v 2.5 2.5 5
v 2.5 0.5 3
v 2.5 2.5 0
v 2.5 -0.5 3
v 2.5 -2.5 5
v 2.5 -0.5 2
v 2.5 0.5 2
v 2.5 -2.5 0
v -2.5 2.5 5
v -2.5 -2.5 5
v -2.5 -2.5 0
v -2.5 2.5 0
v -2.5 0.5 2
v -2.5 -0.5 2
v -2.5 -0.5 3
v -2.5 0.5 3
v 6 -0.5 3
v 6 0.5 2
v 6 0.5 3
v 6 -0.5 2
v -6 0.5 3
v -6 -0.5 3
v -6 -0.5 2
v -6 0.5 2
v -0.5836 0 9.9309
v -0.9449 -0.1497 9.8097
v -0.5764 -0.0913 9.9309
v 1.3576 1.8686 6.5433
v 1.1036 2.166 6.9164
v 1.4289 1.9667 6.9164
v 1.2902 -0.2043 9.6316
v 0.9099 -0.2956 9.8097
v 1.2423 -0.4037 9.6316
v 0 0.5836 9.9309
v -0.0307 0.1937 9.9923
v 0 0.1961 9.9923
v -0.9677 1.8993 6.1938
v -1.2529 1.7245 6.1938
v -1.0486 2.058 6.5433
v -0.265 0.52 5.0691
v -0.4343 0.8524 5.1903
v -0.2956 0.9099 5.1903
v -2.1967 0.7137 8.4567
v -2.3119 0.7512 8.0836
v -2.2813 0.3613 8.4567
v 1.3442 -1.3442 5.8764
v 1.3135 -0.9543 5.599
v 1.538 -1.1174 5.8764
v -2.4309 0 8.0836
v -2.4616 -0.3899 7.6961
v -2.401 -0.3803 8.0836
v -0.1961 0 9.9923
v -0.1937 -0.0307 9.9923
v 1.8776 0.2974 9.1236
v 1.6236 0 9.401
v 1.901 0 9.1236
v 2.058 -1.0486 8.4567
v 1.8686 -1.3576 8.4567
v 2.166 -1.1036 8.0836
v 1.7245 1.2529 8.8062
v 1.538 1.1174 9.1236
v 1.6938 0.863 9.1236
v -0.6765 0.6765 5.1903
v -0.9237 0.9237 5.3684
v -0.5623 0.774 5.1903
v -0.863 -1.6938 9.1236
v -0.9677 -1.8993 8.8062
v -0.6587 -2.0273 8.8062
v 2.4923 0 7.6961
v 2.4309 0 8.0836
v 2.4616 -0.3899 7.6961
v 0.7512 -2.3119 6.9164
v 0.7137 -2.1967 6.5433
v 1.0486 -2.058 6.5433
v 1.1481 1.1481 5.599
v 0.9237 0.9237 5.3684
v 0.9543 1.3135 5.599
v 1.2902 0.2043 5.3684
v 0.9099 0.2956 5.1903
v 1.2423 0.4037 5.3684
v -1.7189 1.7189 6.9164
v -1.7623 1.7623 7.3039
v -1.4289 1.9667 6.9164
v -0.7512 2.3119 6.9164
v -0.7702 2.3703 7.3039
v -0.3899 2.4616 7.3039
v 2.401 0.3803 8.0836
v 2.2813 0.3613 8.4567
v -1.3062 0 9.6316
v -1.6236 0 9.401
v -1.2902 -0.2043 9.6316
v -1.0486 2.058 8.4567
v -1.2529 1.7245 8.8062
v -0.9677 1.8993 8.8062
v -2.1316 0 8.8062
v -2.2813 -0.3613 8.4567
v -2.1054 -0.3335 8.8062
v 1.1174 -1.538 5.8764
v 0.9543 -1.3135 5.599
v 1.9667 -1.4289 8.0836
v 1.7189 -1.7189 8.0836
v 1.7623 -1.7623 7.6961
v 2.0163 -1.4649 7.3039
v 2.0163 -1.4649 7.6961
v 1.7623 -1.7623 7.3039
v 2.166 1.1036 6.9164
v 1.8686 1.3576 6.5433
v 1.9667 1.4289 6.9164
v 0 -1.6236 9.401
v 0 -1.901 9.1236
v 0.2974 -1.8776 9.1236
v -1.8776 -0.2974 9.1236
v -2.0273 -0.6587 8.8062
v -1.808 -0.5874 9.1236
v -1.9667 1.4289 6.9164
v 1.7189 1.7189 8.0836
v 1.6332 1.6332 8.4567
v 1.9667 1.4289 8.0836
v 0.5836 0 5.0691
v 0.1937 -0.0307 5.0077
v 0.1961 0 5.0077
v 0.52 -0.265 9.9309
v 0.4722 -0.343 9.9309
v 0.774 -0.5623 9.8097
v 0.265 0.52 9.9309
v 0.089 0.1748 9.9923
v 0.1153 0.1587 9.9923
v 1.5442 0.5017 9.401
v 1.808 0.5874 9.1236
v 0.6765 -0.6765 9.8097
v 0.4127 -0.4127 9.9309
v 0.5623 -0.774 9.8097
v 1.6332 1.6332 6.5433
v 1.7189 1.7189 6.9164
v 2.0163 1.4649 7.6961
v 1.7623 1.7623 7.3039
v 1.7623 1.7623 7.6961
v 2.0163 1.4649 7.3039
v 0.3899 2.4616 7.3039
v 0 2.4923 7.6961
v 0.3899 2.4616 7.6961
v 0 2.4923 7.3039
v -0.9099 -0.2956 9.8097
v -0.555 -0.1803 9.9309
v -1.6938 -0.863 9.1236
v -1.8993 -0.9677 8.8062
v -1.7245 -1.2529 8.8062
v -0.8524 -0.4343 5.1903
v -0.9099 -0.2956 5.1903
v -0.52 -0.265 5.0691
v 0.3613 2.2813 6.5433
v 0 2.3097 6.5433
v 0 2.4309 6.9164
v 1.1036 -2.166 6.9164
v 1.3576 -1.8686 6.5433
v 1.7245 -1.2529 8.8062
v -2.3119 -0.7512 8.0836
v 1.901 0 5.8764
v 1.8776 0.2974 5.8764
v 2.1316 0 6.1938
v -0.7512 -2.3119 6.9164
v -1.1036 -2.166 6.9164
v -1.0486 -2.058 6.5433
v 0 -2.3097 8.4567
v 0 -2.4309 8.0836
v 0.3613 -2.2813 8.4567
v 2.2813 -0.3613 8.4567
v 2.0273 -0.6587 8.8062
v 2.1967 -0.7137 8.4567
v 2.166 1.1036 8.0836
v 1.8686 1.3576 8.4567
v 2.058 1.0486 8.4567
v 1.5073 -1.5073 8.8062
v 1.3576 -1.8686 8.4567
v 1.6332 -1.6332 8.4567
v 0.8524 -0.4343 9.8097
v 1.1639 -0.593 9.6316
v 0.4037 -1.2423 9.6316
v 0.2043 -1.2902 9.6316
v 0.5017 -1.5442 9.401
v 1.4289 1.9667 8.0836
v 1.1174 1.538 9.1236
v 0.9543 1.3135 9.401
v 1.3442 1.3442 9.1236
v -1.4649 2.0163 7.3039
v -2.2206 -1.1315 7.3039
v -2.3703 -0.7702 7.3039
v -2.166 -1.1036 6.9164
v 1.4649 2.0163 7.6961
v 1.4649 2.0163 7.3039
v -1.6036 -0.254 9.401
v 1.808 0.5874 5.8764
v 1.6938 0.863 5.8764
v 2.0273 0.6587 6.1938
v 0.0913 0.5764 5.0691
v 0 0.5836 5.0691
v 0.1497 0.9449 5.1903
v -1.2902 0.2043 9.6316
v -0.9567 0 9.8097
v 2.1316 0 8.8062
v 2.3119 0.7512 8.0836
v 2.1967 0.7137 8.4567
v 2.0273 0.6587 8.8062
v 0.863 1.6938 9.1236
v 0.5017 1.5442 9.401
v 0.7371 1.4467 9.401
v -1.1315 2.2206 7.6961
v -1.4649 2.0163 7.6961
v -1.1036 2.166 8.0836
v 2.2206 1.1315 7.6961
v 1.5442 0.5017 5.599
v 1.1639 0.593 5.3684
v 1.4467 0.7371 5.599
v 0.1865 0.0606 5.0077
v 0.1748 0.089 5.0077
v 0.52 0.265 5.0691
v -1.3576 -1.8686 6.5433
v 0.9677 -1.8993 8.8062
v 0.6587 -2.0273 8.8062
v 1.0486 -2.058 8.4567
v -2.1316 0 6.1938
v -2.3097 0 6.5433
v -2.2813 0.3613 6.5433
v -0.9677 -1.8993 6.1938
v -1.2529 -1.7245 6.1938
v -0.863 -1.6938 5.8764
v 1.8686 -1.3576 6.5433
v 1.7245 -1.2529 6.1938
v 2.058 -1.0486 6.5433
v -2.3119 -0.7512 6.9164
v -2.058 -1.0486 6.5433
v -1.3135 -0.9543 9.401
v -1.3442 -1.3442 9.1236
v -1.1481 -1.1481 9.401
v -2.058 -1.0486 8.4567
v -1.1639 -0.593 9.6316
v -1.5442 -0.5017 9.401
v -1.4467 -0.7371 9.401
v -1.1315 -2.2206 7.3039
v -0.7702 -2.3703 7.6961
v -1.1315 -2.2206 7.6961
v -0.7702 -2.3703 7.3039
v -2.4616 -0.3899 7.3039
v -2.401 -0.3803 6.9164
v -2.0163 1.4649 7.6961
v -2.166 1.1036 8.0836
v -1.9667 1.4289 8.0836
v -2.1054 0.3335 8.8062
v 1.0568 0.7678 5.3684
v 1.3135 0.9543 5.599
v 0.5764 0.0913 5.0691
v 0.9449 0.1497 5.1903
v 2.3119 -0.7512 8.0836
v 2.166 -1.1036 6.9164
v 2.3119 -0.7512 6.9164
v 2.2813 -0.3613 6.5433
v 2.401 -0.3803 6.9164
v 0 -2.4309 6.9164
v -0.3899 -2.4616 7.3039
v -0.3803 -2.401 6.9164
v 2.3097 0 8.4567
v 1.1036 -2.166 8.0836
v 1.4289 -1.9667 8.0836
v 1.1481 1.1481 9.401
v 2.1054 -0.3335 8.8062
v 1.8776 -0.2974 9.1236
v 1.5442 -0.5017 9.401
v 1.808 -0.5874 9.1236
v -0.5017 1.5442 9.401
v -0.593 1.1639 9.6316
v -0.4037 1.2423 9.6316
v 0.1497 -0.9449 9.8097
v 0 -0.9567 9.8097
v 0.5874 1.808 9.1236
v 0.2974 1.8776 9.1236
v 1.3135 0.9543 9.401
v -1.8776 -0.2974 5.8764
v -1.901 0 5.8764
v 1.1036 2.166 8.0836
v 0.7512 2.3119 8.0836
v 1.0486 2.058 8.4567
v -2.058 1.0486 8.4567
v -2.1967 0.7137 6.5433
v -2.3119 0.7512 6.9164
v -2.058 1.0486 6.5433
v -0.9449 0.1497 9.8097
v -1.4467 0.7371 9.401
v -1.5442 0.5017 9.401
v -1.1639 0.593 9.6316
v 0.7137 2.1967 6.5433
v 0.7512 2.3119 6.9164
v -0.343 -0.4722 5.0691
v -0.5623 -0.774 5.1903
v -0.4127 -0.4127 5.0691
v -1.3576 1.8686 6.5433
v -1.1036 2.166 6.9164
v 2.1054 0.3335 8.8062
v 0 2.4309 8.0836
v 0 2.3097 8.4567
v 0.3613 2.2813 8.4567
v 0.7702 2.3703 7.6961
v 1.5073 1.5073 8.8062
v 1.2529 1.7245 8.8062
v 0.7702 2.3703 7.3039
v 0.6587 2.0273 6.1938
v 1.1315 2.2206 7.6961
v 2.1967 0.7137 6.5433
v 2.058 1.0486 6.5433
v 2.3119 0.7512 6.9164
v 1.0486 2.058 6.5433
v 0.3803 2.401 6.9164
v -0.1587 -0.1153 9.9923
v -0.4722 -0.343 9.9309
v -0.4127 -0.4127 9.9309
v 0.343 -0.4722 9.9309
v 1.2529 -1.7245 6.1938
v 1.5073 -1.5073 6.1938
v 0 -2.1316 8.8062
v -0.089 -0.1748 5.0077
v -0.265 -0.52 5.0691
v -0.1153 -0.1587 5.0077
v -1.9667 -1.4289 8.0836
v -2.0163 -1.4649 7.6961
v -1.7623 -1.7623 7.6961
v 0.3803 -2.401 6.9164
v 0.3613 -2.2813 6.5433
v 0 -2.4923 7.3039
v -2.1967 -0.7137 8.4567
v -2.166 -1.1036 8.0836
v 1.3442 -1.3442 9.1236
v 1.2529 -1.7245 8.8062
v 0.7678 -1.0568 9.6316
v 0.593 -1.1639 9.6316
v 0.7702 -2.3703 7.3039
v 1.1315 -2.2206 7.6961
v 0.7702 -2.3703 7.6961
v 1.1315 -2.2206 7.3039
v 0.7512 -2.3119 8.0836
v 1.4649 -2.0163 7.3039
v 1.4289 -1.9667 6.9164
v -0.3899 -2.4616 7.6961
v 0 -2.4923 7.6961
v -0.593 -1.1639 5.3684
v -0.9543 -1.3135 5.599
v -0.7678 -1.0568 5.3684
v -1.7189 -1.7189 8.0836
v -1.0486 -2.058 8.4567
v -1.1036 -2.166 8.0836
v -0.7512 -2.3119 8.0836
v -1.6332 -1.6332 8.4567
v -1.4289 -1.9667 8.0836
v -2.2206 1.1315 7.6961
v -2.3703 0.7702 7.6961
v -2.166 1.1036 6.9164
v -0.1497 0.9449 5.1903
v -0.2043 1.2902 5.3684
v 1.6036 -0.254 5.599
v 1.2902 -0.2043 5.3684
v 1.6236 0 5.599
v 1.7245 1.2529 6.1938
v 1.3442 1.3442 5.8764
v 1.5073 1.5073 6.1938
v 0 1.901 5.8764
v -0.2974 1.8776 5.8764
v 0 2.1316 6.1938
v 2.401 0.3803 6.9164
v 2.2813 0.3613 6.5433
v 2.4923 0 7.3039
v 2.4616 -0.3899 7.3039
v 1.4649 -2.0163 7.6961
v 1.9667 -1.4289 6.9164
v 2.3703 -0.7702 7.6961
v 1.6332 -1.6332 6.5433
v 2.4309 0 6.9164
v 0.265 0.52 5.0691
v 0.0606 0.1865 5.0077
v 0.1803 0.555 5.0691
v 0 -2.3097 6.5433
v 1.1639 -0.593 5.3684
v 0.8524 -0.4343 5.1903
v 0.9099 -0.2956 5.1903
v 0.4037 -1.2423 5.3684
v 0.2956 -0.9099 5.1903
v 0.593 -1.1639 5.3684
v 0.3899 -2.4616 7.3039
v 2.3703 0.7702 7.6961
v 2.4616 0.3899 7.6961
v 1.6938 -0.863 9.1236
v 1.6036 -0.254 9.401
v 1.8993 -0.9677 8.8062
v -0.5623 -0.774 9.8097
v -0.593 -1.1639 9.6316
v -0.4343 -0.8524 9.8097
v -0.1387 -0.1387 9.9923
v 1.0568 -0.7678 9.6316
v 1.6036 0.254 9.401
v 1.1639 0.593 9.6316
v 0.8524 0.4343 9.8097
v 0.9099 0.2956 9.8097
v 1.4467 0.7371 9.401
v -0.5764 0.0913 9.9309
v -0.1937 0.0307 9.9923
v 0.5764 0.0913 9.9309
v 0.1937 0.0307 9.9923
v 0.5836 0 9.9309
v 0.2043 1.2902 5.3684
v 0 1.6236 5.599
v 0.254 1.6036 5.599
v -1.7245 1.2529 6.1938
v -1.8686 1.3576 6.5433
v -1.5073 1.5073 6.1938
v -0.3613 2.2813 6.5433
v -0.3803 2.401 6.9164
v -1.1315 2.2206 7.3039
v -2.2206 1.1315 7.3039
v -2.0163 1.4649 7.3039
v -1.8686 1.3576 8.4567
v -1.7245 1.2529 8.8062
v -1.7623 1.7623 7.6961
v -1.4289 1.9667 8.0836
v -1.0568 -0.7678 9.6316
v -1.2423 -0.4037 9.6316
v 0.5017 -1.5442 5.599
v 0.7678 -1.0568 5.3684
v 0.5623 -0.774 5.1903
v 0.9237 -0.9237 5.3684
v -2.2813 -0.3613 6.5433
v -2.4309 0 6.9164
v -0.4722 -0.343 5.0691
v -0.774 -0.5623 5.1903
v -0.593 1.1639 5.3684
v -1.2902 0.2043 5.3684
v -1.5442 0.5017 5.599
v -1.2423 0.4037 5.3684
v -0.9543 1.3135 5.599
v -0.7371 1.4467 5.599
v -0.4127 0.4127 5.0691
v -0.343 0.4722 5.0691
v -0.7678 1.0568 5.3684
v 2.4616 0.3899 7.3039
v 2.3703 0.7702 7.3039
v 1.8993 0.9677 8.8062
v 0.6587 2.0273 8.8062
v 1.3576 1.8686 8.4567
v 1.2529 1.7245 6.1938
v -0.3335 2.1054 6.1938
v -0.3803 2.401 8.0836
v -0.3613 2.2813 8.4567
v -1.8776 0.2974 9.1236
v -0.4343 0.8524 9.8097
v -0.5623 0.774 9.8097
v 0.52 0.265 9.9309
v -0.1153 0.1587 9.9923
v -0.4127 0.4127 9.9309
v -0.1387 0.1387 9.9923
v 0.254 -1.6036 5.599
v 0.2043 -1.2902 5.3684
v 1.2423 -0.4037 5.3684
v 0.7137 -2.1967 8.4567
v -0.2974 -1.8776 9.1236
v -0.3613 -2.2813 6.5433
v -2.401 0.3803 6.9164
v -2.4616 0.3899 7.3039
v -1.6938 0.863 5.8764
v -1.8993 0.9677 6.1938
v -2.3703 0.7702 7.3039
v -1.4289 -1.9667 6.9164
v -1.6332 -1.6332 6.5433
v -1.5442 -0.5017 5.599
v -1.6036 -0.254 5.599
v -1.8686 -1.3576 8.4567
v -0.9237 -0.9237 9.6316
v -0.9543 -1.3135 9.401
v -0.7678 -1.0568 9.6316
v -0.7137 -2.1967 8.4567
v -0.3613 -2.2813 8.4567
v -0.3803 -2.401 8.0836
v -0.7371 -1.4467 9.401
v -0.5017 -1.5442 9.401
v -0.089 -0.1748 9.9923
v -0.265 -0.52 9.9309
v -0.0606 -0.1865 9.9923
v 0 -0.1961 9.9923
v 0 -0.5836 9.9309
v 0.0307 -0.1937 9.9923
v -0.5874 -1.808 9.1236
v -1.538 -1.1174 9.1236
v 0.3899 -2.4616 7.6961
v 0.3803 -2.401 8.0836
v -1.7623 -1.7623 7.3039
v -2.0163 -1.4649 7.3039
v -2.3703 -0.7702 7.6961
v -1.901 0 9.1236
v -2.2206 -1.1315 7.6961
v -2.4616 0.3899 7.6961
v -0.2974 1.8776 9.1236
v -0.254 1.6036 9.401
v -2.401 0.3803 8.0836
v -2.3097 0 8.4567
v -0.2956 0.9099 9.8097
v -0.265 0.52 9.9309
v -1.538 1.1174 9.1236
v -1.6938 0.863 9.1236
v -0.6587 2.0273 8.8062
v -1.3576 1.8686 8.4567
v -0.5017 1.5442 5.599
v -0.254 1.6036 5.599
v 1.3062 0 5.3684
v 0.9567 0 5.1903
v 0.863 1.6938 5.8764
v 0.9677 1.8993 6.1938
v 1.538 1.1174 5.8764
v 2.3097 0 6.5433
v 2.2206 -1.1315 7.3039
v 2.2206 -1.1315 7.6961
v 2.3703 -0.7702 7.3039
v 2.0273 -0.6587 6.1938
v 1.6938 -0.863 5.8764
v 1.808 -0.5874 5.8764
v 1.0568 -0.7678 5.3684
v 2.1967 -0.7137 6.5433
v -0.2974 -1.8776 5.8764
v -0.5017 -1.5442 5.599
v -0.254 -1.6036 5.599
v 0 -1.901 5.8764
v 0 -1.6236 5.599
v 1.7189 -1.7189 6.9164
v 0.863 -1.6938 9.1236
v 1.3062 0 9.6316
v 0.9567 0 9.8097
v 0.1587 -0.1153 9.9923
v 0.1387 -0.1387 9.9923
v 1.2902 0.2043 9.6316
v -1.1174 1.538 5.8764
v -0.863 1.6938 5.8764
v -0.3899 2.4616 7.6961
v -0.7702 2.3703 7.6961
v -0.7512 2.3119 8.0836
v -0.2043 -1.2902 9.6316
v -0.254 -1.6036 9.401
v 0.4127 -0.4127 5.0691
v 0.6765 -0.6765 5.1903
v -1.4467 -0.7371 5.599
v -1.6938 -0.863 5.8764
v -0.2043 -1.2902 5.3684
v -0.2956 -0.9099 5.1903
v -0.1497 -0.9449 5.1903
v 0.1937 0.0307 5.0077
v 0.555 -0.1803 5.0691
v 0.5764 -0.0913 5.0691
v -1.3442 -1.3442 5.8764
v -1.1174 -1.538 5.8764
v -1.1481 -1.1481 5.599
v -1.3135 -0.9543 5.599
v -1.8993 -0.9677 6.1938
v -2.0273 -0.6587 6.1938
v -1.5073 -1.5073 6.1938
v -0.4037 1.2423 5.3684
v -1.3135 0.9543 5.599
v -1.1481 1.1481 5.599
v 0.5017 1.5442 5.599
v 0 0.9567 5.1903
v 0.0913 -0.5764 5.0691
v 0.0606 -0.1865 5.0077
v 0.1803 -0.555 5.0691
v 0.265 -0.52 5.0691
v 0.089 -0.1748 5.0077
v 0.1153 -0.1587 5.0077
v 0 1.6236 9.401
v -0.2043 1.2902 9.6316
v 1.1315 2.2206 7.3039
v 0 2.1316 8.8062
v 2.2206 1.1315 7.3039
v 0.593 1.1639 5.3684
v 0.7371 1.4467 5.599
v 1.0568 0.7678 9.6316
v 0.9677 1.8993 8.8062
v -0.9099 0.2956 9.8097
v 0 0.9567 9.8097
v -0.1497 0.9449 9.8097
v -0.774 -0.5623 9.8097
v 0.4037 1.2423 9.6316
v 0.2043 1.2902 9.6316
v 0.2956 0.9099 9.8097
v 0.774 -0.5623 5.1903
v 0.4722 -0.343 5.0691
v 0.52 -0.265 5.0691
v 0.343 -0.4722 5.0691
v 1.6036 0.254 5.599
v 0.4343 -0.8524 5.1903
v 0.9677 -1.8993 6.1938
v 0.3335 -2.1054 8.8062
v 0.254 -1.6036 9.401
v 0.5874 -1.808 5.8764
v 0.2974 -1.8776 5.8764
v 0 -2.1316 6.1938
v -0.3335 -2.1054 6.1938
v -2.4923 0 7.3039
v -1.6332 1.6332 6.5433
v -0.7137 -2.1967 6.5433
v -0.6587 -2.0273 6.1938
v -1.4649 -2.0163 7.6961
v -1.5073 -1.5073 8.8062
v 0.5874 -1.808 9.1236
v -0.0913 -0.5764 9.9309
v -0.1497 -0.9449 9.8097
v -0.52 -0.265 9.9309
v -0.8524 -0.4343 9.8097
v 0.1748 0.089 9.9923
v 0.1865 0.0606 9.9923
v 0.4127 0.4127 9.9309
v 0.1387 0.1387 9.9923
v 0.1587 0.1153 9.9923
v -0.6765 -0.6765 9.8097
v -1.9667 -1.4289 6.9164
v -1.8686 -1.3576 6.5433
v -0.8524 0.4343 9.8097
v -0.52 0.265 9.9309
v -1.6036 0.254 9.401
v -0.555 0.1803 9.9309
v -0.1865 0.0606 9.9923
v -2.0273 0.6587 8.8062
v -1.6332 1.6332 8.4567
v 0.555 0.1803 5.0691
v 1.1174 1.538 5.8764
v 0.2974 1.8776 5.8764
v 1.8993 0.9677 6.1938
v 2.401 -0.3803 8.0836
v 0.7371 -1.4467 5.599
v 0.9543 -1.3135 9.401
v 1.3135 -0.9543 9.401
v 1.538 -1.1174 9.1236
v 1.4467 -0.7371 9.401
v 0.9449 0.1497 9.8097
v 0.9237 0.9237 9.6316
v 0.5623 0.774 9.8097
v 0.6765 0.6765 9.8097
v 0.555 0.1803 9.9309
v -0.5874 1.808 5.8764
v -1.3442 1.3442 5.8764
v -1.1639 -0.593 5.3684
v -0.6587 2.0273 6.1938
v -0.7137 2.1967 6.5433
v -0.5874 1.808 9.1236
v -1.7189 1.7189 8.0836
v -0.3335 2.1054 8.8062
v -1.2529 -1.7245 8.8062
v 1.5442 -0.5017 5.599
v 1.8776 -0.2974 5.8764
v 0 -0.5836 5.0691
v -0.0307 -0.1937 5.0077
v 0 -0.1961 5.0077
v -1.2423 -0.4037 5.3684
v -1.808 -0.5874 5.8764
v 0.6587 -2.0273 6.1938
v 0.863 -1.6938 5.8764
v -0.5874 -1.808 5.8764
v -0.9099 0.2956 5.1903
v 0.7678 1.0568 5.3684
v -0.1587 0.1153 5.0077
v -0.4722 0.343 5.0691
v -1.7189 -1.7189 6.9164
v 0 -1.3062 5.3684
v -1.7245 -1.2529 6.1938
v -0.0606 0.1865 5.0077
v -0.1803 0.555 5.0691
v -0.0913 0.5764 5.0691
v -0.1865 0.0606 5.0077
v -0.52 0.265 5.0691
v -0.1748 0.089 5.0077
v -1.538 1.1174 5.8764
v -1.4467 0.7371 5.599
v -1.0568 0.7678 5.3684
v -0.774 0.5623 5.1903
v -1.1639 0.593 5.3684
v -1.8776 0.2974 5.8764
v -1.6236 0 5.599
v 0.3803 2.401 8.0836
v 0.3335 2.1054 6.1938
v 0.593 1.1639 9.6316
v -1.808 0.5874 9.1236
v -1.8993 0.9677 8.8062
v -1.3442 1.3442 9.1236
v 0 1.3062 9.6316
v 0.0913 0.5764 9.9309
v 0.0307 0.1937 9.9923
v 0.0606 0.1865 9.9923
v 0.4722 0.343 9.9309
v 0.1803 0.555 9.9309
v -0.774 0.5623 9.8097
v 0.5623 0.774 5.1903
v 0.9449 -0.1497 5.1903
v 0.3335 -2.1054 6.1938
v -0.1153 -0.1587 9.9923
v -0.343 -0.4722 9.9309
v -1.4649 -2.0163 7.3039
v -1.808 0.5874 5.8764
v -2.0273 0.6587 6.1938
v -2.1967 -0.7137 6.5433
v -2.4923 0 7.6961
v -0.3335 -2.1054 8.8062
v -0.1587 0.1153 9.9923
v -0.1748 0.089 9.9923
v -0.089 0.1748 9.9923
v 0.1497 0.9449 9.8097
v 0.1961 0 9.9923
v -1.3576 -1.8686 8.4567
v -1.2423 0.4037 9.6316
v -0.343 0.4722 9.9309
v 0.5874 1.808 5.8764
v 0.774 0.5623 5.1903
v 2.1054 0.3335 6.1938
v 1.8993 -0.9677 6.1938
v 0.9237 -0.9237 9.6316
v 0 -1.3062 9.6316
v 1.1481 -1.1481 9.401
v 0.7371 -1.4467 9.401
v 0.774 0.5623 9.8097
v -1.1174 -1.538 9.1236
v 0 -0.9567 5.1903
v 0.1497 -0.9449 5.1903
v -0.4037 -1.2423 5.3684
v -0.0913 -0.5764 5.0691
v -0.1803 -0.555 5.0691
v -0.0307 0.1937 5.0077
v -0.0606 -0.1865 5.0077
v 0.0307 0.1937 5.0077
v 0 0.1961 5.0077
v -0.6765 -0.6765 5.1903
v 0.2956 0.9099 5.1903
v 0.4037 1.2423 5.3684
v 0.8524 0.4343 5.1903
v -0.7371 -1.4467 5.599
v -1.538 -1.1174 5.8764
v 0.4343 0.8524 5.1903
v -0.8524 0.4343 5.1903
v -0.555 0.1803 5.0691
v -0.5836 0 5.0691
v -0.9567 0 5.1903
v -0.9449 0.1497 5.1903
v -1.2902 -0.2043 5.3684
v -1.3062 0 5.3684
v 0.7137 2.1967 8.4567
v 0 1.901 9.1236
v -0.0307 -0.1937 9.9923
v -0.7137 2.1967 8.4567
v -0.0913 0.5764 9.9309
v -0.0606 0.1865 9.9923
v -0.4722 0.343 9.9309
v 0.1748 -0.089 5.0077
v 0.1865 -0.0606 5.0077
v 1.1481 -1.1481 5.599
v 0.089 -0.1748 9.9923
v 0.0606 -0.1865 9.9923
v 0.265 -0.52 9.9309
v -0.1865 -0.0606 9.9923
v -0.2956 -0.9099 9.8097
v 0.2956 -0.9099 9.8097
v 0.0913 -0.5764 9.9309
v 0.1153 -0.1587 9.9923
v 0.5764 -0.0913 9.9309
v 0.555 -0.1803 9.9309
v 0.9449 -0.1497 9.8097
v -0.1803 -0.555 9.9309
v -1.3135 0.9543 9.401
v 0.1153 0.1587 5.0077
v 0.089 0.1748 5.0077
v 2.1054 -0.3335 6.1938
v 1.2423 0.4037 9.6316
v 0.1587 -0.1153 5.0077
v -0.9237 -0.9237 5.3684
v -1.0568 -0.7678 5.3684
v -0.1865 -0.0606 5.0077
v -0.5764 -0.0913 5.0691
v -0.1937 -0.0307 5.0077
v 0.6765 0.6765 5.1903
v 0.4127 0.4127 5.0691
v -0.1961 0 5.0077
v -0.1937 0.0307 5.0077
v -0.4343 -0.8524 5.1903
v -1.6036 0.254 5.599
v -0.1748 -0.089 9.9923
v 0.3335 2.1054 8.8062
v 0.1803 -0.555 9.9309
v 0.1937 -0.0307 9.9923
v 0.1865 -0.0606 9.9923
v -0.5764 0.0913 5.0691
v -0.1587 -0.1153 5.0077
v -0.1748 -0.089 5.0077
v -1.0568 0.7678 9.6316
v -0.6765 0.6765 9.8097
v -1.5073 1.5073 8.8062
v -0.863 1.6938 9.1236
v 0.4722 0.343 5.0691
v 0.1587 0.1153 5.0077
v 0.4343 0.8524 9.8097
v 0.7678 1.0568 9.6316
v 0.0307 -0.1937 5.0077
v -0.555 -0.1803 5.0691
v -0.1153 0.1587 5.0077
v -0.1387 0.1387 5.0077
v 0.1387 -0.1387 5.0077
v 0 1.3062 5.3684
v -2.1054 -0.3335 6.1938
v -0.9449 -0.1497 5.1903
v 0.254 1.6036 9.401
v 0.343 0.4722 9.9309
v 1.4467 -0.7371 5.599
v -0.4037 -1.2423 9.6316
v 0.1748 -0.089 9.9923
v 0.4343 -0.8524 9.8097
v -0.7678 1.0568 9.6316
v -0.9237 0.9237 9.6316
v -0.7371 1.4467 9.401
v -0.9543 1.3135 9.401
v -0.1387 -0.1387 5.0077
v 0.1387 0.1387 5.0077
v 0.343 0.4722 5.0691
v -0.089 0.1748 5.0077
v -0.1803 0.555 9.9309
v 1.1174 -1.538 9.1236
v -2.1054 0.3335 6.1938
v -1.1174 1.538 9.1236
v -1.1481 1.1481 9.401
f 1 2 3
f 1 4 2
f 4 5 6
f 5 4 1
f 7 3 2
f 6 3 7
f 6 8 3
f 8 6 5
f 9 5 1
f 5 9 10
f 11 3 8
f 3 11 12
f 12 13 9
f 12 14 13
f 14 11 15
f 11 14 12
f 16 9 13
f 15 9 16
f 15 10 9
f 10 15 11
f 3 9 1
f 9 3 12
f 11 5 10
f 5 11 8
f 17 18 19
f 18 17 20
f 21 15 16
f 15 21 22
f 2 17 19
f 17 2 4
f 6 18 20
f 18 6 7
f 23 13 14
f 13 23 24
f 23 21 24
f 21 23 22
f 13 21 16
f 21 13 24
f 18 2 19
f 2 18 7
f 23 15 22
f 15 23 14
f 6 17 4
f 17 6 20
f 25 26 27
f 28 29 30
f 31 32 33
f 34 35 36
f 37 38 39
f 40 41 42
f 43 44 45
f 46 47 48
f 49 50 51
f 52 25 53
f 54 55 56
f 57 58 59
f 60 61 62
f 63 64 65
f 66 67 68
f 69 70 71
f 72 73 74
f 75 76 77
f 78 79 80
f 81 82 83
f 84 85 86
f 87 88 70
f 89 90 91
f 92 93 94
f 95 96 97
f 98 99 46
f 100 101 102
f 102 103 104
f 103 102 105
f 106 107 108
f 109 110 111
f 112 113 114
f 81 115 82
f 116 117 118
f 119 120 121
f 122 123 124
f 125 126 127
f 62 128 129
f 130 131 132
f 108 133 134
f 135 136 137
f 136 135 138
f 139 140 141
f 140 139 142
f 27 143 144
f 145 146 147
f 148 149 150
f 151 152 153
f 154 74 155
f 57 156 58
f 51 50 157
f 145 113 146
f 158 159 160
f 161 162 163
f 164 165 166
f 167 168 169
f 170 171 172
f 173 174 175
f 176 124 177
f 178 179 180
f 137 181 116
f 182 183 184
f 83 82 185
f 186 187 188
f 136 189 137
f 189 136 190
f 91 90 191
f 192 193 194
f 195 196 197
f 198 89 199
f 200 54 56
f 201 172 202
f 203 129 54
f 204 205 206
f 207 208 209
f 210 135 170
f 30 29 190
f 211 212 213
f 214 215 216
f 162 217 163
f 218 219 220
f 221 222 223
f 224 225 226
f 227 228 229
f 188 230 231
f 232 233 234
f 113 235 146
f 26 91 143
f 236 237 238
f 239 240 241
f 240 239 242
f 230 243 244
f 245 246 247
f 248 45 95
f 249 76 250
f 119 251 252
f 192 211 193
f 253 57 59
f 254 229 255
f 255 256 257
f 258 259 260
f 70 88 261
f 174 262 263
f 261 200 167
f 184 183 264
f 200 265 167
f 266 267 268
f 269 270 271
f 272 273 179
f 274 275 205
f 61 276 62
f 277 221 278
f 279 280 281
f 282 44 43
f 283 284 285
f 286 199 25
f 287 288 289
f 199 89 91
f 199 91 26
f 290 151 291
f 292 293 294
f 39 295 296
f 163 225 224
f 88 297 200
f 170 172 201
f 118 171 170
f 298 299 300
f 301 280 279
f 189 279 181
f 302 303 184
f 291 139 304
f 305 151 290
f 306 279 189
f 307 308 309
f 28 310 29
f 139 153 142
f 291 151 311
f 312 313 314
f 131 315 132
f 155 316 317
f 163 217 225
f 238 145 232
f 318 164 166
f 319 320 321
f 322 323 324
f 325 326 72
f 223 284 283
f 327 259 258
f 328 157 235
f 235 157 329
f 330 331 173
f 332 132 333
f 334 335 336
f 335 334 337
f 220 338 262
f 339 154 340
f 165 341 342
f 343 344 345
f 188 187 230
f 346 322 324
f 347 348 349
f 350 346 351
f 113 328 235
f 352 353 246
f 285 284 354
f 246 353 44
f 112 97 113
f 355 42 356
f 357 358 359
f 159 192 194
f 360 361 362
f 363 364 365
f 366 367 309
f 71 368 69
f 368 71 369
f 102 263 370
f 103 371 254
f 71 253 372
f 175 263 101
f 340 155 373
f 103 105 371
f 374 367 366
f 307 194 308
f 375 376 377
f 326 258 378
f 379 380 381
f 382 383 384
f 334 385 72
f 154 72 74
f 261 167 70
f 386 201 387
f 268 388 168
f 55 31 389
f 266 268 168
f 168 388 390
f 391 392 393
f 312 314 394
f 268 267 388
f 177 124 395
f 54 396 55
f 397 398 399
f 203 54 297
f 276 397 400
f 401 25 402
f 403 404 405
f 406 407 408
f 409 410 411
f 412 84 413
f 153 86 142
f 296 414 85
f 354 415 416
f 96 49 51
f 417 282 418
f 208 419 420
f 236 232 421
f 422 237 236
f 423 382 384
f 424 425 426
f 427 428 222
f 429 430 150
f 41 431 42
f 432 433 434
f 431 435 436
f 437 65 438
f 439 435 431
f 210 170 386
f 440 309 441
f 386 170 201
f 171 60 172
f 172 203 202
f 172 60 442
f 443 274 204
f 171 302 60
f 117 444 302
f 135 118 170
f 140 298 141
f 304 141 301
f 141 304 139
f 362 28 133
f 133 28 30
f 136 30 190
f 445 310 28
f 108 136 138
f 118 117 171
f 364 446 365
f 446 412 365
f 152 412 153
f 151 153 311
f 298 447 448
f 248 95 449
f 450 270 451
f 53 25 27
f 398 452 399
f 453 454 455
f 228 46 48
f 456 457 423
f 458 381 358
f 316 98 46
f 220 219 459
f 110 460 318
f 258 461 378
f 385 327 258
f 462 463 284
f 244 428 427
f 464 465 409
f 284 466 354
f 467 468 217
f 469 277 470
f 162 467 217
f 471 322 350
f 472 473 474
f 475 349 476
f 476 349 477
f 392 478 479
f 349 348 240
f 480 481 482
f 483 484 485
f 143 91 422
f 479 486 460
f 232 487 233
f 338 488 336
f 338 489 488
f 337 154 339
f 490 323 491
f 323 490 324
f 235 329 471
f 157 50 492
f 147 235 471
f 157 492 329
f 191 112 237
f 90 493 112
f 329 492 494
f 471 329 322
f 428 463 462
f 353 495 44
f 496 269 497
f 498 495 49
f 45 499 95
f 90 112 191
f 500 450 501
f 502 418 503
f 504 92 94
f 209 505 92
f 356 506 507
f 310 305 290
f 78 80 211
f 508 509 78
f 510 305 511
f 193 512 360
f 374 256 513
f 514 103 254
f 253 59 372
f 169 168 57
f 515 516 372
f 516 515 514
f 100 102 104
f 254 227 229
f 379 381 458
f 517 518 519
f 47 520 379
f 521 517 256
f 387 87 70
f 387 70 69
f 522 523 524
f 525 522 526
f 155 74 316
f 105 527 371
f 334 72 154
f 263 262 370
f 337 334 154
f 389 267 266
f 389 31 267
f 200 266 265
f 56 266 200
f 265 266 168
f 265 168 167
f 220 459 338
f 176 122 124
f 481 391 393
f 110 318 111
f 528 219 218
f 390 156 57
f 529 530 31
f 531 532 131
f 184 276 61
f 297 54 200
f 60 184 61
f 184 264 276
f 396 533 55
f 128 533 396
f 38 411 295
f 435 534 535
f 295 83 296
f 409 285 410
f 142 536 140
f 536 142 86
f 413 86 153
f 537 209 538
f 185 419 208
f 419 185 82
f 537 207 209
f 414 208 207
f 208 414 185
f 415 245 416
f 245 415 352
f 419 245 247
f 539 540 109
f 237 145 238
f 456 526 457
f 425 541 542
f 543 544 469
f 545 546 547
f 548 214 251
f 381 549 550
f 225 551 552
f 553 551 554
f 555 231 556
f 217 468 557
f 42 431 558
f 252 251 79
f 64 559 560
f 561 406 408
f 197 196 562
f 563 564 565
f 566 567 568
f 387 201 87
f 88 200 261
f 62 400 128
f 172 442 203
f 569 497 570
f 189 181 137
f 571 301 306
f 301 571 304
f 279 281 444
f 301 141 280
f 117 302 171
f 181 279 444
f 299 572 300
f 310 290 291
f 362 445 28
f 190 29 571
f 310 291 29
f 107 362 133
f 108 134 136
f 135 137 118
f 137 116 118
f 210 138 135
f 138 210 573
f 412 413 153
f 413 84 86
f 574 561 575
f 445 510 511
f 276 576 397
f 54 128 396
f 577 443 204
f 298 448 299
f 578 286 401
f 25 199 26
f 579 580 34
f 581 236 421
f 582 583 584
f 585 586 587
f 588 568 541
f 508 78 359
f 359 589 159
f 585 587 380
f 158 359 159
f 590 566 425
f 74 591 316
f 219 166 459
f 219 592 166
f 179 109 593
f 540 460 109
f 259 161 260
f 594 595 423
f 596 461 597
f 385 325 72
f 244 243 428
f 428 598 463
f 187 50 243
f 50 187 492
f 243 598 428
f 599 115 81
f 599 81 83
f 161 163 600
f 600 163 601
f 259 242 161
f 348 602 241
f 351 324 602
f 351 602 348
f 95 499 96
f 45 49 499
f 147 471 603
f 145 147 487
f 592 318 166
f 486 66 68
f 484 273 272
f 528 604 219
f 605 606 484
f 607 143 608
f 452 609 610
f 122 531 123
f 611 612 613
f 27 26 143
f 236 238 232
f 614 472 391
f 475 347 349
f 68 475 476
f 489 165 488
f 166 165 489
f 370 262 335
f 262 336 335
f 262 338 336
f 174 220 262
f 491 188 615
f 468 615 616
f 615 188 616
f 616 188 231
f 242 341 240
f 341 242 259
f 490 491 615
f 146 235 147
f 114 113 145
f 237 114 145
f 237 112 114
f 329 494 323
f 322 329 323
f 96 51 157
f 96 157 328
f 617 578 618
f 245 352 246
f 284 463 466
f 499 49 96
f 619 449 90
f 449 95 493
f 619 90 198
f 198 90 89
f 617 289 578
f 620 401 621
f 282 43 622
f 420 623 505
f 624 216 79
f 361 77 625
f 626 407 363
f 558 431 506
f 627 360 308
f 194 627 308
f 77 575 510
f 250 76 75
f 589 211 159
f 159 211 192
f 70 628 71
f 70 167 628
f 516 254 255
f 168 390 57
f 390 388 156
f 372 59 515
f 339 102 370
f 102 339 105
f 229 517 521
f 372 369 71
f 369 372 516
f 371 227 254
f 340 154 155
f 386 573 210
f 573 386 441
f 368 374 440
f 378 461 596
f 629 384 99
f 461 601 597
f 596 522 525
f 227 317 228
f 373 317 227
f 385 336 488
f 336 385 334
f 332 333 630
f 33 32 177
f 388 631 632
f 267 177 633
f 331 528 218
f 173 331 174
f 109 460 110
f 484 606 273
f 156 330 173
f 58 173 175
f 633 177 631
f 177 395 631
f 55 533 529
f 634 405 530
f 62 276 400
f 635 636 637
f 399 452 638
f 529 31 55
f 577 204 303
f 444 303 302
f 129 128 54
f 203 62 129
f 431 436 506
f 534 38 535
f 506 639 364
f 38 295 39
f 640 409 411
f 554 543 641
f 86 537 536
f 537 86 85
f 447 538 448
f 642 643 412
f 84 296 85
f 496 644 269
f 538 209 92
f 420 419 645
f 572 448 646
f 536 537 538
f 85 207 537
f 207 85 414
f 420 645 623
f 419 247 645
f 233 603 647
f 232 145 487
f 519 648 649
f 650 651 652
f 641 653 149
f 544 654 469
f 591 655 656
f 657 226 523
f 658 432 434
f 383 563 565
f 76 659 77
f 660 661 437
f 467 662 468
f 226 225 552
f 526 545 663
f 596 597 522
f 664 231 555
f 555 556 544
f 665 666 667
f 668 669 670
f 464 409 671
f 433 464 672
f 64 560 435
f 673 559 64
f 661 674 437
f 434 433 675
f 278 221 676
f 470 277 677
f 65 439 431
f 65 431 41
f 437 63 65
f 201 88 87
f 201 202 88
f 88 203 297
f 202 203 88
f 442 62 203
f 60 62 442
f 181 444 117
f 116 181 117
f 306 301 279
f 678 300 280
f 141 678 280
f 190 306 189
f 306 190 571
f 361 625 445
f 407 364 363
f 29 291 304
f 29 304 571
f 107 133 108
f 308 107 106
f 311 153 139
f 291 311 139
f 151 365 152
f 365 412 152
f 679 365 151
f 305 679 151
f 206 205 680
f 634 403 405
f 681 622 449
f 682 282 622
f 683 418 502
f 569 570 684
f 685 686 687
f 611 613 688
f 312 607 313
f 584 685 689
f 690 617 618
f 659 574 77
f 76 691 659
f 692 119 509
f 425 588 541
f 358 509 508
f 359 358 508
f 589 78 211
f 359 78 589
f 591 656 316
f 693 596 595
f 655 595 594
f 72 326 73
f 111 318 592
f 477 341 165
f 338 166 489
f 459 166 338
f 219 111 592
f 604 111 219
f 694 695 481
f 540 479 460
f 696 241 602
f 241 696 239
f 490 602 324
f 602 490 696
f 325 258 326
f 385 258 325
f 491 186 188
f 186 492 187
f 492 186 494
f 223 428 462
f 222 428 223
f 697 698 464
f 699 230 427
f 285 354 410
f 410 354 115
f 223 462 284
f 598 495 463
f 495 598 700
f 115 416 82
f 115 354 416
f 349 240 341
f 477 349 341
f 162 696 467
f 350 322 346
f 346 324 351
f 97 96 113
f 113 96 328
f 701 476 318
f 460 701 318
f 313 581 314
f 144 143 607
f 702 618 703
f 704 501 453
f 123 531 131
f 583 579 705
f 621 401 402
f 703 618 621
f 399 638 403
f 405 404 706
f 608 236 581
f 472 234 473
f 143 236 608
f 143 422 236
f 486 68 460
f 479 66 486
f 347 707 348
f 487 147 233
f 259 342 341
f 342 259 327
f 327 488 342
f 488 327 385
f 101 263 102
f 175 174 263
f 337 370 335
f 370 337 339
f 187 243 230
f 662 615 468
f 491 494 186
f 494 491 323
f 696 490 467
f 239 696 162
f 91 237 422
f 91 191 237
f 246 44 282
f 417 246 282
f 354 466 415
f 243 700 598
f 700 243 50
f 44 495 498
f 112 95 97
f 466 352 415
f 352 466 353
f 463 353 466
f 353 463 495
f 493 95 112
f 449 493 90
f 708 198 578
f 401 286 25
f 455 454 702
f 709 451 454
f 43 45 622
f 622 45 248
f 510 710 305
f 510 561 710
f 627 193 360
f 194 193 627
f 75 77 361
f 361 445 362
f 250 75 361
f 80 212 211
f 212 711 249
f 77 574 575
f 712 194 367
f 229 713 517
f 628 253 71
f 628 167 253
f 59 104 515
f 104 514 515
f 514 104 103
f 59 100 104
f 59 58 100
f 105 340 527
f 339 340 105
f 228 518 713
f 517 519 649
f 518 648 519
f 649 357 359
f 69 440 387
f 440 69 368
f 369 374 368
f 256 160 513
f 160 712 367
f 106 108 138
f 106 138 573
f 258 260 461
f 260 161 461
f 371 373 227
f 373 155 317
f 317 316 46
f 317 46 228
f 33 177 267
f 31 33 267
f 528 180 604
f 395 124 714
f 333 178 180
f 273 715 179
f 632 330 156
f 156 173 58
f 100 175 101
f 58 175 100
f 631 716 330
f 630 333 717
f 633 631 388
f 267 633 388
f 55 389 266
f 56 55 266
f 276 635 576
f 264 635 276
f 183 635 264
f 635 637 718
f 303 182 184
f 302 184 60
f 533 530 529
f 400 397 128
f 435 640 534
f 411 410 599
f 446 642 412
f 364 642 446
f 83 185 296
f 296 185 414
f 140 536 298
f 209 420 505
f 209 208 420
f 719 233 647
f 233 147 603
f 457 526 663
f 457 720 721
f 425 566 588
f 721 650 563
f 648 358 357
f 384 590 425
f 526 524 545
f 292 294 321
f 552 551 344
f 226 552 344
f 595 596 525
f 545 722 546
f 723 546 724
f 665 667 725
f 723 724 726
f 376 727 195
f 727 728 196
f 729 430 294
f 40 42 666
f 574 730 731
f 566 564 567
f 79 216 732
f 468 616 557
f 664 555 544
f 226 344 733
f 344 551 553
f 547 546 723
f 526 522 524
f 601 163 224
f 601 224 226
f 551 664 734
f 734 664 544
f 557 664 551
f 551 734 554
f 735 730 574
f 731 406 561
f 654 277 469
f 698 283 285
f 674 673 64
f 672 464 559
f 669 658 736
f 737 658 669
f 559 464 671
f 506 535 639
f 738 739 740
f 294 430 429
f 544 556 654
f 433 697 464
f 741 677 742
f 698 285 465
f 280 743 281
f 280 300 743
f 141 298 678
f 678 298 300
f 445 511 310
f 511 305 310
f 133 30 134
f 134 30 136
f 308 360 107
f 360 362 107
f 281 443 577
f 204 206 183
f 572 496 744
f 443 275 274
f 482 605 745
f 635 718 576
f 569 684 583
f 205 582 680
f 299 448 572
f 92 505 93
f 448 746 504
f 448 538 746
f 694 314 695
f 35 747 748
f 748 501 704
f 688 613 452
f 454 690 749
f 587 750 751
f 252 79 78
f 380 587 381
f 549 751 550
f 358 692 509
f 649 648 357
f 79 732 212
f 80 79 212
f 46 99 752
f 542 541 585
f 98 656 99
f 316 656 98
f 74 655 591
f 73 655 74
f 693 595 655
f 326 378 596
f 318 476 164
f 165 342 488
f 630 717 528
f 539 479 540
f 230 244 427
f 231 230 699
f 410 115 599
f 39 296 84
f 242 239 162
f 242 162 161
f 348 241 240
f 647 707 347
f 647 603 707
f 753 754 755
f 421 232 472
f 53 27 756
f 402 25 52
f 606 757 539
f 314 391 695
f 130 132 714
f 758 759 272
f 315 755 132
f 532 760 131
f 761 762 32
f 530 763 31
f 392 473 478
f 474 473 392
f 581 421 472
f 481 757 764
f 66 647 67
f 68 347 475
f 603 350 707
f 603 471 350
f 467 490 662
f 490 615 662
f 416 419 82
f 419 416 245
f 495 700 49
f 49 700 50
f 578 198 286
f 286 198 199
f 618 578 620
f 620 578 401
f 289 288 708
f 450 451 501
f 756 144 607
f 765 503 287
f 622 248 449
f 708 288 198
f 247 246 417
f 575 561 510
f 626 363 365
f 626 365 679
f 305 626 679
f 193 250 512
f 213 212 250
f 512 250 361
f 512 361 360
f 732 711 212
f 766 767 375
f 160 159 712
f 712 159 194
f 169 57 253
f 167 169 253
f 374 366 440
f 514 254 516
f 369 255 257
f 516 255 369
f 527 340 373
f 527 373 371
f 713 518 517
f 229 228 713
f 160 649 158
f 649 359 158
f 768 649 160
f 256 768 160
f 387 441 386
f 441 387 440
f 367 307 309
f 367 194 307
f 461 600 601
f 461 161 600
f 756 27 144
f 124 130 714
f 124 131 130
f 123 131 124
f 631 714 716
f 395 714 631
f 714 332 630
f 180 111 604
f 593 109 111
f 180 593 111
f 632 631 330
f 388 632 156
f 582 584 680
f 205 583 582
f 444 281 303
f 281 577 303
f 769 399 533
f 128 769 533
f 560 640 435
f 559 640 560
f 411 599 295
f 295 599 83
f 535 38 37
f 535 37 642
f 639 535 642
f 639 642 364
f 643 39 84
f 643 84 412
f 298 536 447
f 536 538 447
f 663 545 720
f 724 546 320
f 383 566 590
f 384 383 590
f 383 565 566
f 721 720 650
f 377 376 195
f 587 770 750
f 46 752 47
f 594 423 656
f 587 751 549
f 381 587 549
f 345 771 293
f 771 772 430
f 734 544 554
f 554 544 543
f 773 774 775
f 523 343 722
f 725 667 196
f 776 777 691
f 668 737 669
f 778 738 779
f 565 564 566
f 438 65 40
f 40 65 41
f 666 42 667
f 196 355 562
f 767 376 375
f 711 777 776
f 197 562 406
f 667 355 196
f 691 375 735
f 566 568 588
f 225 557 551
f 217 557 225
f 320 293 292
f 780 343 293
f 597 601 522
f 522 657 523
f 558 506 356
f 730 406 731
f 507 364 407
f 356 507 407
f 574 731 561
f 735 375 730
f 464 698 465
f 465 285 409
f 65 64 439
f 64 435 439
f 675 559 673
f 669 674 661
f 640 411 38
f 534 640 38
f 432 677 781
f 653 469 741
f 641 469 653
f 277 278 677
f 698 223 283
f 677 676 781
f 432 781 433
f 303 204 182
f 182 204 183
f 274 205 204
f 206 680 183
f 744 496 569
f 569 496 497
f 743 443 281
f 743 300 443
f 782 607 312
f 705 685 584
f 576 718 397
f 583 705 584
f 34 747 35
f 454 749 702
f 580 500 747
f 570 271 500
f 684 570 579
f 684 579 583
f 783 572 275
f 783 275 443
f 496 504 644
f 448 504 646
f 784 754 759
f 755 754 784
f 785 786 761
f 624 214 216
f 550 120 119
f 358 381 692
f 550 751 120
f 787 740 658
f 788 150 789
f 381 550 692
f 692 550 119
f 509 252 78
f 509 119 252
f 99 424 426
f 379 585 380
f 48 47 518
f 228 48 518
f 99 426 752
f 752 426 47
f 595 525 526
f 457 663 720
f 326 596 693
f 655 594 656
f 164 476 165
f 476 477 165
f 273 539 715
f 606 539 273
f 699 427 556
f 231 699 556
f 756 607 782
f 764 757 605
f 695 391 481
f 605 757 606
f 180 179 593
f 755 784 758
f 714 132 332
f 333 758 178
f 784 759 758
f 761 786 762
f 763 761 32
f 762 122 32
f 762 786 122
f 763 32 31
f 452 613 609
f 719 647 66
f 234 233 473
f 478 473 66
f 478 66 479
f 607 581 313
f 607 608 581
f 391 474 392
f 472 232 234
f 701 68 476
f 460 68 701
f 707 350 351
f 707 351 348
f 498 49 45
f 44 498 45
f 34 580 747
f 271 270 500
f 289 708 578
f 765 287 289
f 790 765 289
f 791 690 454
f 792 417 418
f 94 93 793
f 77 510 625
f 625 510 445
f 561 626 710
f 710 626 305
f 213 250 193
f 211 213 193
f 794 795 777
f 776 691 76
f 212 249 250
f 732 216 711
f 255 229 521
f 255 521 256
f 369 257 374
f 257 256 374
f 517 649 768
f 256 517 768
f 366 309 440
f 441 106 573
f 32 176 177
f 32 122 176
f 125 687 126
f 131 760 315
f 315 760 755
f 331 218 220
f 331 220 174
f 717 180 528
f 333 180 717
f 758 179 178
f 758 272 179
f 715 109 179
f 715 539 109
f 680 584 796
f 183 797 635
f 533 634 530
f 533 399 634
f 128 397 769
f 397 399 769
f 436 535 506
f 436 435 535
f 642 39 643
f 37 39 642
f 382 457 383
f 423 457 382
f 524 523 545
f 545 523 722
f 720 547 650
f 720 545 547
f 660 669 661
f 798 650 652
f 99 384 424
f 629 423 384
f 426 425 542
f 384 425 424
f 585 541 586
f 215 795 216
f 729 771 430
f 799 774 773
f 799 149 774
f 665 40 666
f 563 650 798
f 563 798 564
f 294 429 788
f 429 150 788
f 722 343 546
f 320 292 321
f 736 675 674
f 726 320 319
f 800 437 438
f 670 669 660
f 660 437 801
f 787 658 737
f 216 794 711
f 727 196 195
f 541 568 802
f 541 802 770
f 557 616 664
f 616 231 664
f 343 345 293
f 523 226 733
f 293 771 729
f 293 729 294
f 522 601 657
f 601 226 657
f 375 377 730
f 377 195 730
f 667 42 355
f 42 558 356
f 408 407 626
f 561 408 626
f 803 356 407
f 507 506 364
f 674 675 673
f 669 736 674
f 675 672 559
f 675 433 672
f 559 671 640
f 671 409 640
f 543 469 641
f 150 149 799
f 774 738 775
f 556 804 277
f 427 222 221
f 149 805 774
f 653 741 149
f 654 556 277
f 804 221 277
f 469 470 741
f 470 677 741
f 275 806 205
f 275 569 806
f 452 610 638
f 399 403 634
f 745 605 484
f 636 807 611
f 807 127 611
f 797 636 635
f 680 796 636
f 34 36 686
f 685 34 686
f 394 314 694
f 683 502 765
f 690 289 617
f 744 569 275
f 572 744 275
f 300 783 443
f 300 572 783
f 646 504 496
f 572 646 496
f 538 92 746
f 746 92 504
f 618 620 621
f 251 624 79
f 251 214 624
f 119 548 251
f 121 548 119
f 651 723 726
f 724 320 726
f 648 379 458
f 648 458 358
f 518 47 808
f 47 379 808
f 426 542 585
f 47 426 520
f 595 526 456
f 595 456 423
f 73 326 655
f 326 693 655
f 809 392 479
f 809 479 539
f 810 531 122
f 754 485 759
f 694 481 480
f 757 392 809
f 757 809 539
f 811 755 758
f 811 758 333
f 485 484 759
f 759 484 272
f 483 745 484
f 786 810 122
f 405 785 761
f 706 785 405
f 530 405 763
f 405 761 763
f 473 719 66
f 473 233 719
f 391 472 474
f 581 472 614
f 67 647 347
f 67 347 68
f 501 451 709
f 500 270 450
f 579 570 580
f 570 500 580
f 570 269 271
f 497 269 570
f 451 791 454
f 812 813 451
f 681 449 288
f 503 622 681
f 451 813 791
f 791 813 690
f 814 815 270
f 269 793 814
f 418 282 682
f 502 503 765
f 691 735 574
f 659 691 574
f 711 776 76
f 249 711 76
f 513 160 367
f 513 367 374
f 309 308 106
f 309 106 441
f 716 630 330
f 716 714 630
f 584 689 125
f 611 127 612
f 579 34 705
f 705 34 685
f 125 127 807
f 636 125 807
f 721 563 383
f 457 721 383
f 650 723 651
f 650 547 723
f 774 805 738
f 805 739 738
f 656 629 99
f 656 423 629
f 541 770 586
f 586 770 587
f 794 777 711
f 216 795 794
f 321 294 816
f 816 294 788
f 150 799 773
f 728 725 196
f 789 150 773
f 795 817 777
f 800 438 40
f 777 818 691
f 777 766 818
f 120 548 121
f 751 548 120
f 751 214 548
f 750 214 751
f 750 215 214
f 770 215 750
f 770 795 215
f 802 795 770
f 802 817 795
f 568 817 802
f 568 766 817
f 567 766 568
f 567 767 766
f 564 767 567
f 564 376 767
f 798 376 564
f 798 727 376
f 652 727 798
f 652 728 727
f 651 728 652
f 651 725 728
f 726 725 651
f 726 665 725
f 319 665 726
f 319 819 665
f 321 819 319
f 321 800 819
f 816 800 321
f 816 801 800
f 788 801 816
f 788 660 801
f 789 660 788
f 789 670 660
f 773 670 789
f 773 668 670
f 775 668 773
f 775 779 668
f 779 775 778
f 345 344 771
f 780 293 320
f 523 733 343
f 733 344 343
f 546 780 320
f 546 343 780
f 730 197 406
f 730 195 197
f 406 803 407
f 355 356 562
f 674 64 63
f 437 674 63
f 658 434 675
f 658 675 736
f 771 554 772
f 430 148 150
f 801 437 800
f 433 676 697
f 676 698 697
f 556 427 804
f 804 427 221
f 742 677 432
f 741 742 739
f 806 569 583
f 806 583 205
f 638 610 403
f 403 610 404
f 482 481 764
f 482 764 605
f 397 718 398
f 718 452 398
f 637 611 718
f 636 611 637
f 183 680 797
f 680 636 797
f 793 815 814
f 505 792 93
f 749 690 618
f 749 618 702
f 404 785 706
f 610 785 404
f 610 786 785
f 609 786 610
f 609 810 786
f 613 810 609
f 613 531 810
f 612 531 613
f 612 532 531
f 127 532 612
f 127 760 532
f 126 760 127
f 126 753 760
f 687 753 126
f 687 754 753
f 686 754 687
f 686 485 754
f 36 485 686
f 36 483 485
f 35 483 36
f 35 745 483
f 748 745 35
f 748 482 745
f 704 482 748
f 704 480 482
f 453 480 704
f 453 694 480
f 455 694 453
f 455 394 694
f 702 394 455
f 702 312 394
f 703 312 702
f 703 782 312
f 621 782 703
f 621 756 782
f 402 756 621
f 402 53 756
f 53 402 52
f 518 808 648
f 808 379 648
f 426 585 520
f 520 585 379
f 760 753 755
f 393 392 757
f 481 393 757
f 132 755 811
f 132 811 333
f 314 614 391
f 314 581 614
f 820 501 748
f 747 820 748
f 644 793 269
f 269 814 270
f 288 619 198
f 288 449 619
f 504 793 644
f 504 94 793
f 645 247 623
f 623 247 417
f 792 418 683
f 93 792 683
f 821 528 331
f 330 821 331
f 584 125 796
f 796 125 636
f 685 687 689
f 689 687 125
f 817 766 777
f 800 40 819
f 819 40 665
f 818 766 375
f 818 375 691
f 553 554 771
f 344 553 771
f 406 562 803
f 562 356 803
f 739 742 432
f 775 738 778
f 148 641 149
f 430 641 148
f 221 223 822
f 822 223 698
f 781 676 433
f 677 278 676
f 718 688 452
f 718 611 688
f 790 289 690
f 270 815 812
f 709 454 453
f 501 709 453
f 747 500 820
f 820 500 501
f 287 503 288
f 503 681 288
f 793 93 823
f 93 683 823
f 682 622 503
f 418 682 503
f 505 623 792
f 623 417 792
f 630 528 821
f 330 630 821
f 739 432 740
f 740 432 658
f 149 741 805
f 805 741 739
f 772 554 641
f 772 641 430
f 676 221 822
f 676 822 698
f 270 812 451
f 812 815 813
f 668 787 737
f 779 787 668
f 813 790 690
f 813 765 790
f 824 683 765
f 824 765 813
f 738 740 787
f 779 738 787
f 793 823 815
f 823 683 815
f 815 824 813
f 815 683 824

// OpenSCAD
// Part = 0 draws everything at once
// Any other number draws a section that's exported as one object
part = 0; 

$fn = 40;

// Reposition everything to the level of the floor.
translate([0, 0, 2.5]){

    // Body
    if(part == 1 || part == 0){
        // These two items are exported as one object.
        cube([5, 5, 5], center = true);
        cube([12, 1, 1], center = true);
    }
     
    // Head
    if(part == 2 || part == 0){
        translate([0, 0, 5]) sphere(d = 5);
    }
     

}
